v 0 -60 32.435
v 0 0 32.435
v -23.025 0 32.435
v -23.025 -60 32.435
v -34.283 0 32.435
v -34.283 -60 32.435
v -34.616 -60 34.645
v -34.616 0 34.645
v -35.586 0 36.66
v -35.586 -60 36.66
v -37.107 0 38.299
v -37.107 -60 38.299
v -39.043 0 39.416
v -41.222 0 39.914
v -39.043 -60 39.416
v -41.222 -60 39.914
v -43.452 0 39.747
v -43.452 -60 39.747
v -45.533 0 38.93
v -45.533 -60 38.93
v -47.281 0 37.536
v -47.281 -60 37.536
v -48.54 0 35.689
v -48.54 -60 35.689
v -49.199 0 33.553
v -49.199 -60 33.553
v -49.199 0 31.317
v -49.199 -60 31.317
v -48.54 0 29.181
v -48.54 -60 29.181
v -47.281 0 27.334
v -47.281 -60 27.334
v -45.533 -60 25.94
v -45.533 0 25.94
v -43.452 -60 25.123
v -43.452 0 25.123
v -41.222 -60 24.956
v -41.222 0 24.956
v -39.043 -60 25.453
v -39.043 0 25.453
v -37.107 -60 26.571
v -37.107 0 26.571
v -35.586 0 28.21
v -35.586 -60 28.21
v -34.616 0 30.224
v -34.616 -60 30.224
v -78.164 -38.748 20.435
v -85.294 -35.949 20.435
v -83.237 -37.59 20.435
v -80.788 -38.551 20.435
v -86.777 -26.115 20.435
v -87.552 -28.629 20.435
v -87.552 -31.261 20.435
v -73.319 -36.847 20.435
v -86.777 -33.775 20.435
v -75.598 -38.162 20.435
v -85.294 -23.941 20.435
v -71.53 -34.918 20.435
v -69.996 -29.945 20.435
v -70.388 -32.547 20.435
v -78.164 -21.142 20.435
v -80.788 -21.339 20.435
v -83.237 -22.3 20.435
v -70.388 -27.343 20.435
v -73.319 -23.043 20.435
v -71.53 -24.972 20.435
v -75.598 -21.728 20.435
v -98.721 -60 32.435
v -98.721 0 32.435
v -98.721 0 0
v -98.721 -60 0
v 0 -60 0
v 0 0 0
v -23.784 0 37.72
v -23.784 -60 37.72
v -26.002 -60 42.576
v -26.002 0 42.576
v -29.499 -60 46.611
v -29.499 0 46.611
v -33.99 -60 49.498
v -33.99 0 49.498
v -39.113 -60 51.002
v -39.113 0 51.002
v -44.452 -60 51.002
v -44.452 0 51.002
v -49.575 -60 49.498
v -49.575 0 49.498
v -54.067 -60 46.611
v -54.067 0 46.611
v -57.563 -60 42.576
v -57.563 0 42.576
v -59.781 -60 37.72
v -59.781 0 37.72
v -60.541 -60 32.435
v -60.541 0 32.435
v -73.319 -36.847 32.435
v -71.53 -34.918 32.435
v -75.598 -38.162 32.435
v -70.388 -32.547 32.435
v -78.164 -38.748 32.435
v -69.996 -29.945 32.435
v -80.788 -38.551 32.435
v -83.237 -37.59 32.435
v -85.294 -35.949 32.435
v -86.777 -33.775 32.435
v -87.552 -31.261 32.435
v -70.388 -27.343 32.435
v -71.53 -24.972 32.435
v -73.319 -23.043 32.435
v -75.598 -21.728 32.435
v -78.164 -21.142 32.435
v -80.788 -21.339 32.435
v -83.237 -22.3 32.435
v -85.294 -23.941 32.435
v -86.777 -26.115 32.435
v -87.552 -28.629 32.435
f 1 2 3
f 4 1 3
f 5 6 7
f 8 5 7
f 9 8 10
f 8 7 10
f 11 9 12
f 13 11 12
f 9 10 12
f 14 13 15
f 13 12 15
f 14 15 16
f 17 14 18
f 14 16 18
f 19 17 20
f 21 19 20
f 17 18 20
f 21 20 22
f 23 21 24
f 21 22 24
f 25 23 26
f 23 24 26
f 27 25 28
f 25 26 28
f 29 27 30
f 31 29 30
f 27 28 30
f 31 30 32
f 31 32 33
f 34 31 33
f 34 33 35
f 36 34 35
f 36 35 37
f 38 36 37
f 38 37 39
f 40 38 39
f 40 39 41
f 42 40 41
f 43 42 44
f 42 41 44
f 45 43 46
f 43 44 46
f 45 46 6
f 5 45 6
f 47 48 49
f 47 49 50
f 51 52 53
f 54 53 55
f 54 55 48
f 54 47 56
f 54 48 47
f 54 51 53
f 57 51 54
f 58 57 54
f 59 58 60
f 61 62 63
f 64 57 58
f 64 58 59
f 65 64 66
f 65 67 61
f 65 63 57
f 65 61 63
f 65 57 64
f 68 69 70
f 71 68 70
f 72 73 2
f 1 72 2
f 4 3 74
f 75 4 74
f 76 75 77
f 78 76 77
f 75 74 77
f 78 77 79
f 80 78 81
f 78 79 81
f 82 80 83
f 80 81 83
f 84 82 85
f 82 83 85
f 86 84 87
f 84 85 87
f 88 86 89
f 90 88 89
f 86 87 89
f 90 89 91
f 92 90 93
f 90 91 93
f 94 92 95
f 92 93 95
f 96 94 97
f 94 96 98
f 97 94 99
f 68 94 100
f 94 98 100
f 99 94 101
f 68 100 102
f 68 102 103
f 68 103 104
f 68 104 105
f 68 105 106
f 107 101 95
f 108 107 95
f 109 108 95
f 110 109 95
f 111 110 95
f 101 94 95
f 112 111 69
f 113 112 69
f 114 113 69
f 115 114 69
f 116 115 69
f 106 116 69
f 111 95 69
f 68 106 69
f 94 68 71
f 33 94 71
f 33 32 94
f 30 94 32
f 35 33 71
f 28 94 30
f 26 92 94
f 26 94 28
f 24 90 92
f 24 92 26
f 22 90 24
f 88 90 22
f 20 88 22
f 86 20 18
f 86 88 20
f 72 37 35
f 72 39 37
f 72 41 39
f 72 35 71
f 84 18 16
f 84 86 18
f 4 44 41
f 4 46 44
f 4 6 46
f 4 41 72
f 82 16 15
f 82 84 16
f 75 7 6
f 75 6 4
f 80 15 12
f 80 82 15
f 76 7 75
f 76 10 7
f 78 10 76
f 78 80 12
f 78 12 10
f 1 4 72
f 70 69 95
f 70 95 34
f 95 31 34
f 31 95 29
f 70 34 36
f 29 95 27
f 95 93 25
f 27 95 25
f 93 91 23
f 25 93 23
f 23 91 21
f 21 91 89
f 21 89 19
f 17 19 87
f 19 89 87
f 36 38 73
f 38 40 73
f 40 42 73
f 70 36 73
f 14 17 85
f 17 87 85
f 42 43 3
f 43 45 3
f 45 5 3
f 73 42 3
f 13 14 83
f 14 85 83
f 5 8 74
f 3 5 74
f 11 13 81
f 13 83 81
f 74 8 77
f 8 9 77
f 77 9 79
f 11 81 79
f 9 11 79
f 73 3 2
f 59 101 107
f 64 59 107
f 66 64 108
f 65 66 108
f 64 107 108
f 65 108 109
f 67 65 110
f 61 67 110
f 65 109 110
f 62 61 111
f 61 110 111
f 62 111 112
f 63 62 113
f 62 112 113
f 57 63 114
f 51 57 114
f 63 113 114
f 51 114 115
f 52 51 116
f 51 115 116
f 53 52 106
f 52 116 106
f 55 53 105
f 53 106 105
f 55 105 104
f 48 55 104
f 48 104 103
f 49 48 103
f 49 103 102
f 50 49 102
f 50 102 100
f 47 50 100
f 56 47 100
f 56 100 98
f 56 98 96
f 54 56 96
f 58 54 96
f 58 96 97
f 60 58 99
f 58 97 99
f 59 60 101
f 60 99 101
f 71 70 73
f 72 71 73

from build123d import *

# Parameters (mm, degrees)
F1_DEPTH = 60
F2_R     = 7.5
F3_DEPTH = 60
F5_R     = 8.827636
F6_DEPTH = 12


with BuildPart() as f1:
    # F0 (on Front) → F1 (new body)
    with BuildSketch(Plane.XZ):
        with BuildLine():
            Line((-98.720774, 0), (0, 0))
            Line((0, 0), (0, 32.434803))
            Line((0, 32.434803), (-22.520235, 32.434803))
            Line((-22.520235, 32.434803), (-23.024651, 32.434803))
            ThreePointArc((-23.024651, 32.434803), (-41.782826, 51.192978), (-60.541002, 32.434803))
            Line((-60.541002, 32.434803), (-61.611962, 32.434803))
            Line((-61.611962, 32.434803), (-98.720774, 32.434803))
            Line((-98.720774, 32.434803), (-98.720774, 0))
        make_face()
    extrude(amount=F1_DEPTH)

    # F2 (on face) → F3 (cut, through all)
    with BuildSketch(Plane.XZ.offset(60)):
        with Locations((-41.782826, 32.434803)):
            Circle(F2_R)
    extrude(amount=-F3_DEPTH, mode=Mode.SUBTRACT)

    # F5 (on face) → F6 (cut)
    with BuildSketch(Plane.XY.offset(32.434803)):
        with Locations((-78.823261, -29.944986)):
            Circle(F5_R)
    extrude(amount=-F6_DEPTH, mode=Mode.SUBTRACT)


solid = f1.part
